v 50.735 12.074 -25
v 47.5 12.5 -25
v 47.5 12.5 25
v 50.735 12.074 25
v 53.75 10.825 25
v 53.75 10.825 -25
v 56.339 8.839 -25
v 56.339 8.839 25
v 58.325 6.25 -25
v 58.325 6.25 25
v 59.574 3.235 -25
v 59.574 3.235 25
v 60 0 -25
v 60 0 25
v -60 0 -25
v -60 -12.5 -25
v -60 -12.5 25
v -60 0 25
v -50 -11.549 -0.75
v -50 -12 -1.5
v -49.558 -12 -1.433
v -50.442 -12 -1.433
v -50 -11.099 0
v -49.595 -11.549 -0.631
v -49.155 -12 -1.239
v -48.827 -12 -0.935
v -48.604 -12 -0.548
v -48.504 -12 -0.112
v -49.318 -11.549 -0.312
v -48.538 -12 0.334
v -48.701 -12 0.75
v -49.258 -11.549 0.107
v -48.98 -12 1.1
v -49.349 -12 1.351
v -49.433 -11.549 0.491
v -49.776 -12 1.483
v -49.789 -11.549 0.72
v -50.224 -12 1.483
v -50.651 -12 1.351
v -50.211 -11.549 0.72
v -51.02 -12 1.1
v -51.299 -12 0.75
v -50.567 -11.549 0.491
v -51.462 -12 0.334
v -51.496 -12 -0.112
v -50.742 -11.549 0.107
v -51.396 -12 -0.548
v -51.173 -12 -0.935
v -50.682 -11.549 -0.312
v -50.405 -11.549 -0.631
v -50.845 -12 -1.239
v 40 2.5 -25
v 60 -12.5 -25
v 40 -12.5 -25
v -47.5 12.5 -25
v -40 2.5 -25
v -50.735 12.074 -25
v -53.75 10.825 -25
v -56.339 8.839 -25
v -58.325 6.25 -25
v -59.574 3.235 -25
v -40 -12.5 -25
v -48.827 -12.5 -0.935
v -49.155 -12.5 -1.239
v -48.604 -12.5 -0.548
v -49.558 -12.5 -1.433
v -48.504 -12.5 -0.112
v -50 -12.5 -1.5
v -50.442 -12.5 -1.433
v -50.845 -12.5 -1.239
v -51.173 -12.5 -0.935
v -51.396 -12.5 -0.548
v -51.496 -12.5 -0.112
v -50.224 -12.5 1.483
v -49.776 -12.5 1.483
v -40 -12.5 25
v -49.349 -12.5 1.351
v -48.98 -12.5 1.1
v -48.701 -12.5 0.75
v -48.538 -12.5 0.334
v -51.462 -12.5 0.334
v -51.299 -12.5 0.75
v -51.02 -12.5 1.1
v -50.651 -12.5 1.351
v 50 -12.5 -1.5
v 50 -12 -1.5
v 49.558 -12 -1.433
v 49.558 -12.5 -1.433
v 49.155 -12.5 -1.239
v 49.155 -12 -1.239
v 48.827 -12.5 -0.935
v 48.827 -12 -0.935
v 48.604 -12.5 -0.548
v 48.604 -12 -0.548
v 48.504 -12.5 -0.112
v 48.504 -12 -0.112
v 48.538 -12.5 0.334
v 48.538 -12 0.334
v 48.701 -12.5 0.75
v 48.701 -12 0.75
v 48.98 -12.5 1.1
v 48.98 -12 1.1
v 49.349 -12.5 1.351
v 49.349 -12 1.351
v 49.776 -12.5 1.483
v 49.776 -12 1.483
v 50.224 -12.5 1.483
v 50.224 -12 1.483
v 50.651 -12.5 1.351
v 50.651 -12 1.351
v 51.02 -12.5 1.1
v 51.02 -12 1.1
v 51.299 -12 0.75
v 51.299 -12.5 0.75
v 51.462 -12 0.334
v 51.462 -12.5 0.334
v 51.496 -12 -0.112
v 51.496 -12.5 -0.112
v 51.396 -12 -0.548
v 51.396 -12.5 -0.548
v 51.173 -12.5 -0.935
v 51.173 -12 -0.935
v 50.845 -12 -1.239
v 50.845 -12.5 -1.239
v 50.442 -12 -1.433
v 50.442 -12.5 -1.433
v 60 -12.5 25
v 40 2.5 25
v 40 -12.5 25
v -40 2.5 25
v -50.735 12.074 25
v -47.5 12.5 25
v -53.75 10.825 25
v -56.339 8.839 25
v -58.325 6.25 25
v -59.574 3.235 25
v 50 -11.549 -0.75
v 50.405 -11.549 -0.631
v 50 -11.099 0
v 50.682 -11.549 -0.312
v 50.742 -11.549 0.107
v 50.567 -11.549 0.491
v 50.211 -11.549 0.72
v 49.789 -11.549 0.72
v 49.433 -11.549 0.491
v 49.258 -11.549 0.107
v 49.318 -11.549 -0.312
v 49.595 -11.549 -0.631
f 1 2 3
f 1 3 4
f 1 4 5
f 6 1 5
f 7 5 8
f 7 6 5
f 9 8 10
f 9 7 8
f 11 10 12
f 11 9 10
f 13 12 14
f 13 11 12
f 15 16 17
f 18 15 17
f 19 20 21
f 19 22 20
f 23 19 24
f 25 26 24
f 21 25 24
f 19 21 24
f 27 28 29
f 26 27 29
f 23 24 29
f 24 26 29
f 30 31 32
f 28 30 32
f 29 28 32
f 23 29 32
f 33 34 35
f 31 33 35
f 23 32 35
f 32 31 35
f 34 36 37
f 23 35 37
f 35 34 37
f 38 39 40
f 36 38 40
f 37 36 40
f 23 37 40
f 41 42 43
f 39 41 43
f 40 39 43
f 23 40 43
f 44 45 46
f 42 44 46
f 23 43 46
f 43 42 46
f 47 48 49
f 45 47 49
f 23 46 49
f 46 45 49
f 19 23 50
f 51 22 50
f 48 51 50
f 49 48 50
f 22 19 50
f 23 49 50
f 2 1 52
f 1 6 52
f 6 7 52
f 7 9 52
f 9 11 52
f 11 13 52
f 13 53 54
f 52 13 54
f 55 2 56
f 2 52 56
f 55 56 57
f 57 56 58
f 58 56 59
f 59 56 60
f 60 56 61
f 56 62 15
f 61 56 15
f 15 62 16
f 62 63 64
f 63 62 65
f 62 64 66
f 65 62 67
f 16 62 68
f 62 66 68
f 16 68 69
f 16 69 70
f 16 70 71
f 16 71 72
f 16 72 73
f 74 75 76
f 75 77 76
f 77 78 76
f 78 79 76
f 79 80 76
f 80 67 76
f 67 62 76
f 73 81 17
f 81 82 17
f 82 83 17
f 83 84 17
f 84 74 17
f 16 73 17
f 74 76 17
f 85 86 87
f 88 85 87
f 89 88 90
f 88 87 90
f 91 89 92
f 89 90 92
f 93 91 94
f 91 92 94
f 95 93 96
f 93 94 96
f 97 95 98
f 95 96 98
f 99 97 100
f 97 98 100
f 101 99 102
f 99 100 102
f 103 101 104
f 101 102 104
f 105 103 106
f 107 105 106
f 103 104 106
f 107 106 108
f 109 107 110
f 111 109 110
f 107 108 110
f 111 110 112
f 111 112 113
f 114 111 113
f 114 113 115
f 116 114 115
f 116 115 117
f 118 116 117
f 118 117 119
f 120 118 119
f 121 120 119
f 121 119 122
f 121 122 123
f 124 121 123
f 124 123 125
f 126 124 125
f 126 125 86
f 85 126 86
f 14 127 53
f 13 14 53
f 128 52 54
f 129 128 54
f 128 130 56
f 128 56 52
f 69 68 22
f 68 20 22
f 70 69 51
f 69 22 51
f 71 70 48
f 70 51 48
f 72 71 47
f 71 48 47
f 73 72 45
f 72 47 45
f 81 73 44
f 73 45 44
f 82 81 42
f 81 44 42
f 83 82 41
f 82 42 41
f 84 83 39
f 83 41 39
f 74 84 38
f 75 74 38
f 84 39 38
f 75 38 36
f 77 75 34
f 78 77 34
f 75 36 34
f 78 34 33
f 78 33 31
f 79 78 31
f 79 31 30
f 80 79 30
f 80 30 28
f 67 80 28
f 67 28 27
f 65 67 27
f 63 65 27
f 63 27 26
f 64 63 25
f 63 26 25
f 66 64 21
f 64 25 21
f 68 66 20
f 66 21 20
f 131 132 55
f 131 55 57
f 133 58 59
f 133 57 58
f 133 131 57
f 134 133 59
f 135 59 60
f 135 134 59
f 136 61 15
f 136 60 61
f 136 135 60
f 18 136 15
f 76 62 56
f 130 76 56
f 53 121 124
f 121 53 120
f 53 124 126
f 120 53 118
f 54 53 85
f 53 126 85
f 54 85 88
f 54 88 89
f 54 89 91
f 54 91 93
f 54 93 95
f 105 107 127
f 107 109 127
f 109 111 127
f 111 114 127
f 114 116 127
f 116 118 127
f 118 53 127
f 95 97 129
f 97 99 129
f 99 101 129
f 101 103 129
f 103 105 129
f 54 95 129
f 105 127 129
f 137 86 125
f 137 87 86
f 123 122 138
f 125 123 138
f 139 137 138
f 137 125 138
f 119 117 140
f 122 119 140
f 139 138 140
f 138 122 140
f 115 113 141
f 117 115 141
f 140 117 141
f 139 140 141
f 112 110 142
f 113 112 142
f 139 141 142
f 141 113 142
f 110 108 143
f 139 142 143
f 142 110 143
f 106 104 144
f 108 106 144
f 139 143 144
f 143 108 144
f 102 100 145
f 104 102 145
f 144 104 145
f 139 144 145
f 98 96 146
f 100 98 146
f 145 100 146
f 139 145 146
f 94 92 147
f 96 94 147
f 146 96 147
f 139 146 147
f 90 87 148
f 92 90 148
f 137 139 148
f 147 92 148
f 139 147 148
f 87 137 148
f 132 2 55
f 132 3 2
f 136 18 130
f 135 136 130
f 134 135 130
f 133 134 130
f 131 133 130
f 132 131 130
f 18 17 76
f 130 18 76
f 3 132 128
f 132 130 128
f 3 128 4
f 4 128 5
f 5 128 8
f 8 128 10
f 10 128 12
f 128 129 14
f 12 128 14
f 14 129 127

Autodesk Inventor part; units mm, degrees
ref_plane "YZ Plane" through (0, 0, 0) normal (1, 0, 0) x (0, 1, 0)
ref_plane "XZ Plane" through (0, 0, 0) normal (0, 1, 0) x (-1, 0, 0)
ref_plane "XY Plane" through (0, 0, 0) normal (0, 0, 1) x (1, 0, 0)
sketch "Sketch1" plane through (0, 0, 0) normal (0, 1, 0) x (-1, 0, 0)
  line L0 (60, 25) -> (-60, 25)
  line L1 (-60, 25) -> (-60, -25)
  line L2 (-60, -25) -> (60, -25)
  line L3 (60, -25) -> (60, 25)
  point P0 (0, 0)
extrude "Extrusion1" add sketch "Sketch1" along normal mid plane 25
sketch "Sketch2" plane through (-60, 12.5, 25) normal (0, 0, 1) x (1, 0, 0)
  line L0 (0, -25) -> (120, -25) projected
  line L1 (60, -25) -> (20, -25)
  line L2 (20, -25) -> (20, -10)
  line L3 (20, -10) -> (100, -10)
  line L4 (100, -10) -> (100, -25)
  line L5 (100, -25) -> (60, -25)
  point P0 (60, -12.5)
  dimension "d5" = 15
  dimension "d6" = 80
extrude "Extrusion2" cut sketch "Sketch2" against normal through all
fillet "Fillet1" radius 12.5 2 edges at (60, 12.5, 0) (-60, 12.5, 0)
sketch "Sketch3" plane through (0, -12.5, 0) normal (0, -1, 0) x (1, 0, 0)
  line L0 (-60, 25) -> (-60, -25) projected
  line L1 (60, -25) -> (60, 25) projected
  point P0 (0, 0)
  point P1 (-50, 0)
  point P2 (50, 0)
hole "Hole1" at (-50, -12.5, 0) at (50, -12.5, 0) direction (0, 1, 0) diameter 3 depth 0.5 tip angle 118
properties part number "newsteelhandle" material "Steel"
